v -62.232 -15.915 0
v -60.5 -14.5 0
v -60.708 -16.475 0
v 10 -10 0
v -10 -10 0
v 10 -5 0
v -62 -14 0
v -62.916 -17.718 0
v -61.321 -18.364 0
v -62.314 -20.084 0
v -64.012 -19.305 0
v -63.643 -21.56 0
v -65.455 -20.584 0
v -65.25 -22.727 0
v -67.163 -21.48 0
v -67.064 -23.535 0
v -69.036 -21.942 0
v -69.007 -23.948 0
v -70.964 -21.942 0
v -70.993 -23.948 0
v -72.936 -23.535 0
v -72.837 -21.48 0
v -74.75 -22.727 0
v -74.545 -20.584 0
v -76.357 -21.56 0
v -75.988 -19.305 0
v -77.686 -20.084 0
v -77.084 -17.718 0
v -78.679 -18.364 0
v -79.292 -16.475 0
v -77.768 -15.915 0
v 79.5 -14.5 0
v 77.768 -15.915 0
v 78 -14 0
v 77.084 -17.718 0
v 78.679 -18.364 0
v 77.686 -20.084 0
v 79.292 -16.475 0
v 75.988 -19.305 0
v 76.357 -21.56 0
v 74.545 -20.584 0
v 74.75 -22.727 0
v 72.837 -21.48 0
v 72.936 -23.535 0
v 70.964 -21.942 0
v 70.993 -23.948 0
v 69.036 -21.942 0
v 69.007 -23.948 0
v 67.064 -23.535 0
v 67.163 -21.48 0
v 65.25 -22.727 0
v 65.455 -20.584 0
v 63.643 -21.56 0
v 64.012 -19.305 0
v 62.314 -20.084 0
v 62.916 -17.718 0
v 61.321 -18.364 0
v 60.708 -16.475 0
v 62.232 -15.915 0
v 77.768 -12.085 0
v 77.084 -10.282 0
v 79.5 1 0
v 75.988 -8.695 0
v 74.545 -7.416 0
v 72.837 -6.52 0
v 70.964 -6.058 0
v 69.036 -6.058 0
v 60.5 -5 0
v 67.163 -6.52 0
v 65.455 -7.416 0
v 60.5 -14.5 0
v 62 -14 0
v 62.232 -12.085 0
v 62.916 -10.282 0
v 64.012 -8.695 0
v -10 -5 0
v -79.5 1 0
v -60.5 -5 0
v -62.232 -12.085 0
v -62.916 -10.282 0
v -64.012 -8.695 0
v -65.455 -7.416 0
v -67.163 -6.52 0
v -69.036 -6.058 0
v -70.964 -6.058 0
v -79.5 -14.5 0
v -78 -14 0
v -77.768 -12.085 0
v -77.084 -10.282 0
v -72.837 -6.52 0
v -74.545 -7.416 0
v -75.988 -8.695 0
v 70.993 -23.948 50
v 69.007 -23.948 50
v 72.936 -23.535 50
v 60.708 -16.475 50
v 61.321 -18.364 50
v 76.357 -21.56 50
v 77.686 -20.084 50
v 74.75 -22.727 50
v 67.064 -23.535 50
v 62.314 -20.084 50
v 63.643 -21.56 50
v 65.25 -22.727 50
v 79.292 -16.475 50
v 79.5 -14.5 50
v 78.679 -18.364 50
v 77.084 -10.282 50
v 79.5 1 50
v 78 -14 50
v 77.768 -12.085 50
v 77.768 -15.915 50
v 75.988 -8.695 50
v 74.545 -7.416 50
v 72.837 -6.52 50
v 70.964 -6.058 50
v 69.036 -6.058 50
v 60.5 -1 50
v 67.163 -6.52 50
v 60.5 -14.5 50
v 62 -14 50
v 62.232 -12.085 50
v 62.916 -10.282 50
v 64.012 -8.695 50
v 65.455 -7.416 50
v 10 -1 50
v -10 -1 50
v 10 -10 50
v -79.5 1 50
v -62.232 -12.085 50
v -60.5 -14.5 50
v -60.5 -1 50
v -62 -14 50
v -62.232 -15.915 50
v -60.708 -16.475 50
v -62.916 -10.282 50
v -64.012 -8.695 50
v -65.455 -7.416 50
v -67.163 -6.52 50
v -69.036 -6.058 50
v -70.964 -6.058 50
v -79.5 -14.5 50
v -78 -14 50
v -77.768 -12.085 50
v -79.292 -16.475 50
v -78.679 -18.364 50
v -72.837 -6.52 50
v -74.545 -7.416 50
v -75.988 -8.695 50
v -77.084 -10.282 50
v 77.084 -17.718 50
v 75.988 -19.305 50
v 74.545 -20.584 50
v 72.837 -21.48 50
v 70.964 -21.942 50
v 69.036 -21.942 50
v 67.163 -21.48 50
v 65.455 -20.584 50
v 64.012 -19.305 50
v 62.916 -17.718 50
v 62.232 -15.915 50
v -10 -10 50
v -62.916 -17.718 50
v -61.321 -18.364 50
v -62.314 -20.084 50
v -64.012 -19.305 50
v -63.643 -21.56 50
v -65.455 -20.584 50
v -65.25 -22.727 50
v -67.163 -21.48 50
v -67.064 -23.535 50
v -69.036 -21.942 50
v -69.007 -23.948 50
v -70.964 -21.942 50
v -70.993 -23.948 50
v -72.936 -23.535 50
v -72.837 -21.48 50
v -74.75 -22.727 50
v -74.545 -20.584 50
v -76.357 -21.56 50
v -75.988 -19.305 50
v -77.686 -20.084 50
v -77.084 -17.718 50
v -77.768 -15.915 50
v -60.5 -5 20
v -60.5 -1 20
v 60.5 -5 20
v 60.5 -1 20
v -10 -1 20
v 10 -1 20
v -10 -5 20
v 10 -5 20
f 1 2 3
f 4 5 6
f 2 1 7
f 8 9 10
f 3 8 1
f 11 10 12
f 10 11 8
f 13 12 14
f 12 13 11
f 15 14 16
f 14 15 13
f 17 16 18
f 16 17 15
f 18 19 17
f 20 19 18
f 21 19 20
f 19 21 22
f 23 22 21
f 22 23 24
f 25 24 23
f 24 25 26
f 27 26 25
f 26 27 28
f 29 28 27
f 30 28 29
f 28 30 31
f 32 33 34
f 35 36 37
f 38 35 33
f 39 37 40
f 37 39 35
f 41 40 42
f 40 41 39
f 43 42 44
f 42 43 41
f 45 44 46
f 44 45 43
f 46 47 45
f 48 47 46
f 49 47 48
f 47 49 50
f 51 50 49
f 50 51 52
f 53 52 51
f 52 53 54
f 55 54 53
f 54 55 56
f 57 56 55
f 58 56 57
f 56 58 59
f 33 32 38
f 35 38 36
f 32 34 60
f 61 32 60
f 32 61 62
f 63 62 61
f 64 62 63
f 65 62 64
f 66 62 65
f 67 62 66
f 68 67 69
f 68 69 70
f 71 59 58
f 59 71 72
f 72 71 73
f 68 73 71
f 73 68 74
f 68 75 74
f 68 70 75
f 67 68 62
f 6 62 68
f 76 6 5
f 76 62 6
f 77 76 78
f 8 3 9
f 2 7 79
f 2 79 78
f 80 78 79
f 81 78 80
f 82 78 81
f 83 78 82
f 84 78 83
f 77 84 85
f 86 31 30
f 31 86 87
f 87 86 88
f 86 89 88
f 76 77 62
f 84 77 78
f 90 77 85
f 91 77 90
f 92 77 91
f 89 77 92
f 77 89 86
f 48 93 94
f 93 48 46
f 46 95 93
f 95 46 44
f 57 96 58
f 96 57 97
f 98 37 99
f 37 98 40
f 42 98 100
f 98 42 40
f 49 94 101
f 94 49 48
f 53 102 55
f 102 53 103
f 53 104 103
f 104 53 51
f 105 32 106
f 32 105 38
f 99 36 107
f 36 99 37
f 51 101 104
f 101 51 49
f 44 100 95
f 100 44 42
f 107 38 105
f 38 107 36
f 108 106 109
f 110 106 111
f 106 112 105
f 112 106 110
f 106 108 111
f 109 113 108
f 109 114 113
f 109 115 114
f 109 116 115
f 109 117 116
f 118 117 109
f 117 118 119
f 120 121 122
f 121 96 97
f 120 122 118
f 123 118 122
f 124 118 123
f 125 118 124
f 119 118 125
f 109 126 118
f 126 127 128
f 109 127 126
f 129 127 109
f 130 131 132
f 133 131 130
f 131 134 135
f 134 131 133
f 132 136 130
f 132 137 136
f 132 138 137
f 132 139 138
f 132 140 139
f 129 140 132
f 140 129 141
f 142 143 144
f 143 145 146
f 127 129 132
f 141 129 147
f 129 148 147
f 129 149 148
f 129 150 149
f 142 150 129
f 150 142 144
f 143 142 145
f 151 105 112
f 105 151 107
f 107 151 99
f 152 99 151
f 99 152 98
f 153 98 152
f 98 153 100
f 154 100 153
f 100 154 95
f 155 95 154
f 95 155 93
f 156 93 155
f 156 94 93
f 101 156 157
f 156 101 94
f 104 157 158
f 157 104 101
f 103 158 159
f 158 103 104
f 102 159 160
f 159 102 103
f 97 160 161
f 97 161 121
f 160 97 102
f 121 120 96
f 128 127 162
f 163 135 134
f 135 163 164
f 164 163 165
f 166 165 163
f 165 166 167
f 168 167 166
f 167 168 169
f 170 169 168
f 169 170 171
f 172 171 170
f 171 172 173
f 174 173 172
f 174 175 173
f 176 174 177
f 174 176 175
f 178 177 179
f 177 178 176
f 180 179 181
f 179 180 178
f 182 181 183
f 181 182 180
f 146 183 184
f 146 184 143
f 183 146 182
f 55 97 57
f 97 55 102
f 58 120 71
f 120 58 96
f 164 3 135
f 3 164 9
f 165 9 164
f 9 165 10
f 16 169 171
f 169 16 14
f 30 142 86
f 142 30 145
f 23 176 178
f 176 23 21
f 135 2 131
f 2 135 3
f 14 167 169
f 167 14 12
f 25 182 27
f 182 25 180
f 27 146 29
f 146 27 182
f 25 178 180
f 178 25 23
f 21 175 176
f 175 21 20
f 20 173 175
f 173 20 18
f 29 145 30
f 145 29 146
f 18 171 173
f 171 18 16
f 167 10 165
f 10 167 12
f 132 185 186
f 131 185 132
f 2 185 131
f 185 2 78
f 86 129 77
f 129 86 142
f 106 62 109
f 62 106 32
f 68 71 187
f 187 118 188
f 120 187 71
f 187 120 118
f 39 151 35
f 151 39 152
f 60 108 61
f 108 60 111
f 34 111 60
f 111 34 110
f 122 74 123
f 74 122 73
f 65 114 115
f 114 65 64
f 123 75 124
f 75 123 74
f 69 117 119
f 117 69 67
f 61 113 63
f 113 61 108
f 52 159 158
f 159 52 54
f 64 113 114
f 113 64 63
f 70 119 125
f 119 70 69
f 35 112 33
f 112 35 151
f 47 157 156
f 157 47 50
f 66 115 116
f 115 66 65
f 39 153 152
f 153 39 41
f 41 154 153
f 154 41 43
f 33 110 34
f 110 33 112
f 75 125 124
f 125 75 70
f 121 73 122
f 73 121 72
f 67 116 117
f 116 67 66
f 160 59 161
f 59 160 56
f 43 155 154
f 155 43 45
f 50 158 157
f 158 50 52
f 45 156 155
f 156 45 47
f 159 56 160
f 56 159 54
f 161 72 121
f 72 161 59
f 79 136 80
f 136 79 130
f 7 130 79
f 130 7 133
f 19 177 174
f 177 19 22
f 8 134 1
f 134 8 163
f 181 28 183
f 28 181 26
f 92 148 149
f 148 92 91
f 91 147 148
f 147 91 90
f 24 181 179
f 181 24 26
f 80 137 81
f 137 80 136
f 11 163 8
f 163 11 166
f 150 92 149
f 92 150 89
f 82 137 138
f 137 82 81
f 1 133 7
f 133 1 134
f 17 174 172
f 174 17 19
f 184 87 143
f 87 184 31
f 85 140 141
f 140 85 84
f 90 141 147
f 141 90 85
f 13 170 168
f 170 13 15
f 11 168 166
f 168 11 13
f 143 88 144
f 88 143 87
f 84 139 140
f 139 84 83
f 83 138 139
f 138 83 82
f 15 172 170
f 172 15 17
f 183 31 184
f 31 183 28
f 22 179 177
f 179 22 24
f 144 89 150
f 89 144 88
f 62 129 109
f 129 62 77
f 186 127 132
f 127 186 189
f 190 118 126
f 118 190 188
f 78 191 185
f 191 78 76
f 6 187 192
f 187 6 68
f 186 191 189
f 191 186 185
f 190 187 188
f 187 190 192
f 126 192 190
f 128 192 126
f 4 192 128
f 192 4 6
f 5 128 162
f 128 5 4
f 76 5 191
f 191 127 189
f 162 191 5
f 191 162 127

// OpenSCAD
rotate([-90,0,0]){
difference(){

union(){

// Bloques rodamientos

translate([140/2,0,-15/2-2-5])rotate([90,0,0]) cylinder(h=24*2+2,r=15/2+2);
translate([-(140/2),0,-15/2-2-5])rotate([90,0,0]) cylinder(h=24*2+2,r=15/2+2);

translate([-140/2-15/2-2,-(24*2+2),(-15/2-2-5)]) cube([19,24*2+2,-(-15/2-2-5)]);

translate([140/2-15/2-2,-(24*2+2),(-15/2-2-5)]) cube([19,24*2+2,-(-15/2-2-5)]);

}

union(){
// Rodamientos
translate([140/2,1,-15/2+0.5-2-5])rotate([90,0,0]) cylinder(h=24*2+4,r=15/2+0.5);
translate([-140/2,1,-15/2+0.5-2-5])rotate([90,0,0]) cylinder(h=24*2+4,r=15/2+0.5);
}
}

translate([-140/2-19/2,-50,-1])cube([140+19,24+24+2,2]);
translate([-140/2,-20,-5])cube([140,20,5]);
translate([-20/2,-50,-10])cube([20,50,10]);
}
